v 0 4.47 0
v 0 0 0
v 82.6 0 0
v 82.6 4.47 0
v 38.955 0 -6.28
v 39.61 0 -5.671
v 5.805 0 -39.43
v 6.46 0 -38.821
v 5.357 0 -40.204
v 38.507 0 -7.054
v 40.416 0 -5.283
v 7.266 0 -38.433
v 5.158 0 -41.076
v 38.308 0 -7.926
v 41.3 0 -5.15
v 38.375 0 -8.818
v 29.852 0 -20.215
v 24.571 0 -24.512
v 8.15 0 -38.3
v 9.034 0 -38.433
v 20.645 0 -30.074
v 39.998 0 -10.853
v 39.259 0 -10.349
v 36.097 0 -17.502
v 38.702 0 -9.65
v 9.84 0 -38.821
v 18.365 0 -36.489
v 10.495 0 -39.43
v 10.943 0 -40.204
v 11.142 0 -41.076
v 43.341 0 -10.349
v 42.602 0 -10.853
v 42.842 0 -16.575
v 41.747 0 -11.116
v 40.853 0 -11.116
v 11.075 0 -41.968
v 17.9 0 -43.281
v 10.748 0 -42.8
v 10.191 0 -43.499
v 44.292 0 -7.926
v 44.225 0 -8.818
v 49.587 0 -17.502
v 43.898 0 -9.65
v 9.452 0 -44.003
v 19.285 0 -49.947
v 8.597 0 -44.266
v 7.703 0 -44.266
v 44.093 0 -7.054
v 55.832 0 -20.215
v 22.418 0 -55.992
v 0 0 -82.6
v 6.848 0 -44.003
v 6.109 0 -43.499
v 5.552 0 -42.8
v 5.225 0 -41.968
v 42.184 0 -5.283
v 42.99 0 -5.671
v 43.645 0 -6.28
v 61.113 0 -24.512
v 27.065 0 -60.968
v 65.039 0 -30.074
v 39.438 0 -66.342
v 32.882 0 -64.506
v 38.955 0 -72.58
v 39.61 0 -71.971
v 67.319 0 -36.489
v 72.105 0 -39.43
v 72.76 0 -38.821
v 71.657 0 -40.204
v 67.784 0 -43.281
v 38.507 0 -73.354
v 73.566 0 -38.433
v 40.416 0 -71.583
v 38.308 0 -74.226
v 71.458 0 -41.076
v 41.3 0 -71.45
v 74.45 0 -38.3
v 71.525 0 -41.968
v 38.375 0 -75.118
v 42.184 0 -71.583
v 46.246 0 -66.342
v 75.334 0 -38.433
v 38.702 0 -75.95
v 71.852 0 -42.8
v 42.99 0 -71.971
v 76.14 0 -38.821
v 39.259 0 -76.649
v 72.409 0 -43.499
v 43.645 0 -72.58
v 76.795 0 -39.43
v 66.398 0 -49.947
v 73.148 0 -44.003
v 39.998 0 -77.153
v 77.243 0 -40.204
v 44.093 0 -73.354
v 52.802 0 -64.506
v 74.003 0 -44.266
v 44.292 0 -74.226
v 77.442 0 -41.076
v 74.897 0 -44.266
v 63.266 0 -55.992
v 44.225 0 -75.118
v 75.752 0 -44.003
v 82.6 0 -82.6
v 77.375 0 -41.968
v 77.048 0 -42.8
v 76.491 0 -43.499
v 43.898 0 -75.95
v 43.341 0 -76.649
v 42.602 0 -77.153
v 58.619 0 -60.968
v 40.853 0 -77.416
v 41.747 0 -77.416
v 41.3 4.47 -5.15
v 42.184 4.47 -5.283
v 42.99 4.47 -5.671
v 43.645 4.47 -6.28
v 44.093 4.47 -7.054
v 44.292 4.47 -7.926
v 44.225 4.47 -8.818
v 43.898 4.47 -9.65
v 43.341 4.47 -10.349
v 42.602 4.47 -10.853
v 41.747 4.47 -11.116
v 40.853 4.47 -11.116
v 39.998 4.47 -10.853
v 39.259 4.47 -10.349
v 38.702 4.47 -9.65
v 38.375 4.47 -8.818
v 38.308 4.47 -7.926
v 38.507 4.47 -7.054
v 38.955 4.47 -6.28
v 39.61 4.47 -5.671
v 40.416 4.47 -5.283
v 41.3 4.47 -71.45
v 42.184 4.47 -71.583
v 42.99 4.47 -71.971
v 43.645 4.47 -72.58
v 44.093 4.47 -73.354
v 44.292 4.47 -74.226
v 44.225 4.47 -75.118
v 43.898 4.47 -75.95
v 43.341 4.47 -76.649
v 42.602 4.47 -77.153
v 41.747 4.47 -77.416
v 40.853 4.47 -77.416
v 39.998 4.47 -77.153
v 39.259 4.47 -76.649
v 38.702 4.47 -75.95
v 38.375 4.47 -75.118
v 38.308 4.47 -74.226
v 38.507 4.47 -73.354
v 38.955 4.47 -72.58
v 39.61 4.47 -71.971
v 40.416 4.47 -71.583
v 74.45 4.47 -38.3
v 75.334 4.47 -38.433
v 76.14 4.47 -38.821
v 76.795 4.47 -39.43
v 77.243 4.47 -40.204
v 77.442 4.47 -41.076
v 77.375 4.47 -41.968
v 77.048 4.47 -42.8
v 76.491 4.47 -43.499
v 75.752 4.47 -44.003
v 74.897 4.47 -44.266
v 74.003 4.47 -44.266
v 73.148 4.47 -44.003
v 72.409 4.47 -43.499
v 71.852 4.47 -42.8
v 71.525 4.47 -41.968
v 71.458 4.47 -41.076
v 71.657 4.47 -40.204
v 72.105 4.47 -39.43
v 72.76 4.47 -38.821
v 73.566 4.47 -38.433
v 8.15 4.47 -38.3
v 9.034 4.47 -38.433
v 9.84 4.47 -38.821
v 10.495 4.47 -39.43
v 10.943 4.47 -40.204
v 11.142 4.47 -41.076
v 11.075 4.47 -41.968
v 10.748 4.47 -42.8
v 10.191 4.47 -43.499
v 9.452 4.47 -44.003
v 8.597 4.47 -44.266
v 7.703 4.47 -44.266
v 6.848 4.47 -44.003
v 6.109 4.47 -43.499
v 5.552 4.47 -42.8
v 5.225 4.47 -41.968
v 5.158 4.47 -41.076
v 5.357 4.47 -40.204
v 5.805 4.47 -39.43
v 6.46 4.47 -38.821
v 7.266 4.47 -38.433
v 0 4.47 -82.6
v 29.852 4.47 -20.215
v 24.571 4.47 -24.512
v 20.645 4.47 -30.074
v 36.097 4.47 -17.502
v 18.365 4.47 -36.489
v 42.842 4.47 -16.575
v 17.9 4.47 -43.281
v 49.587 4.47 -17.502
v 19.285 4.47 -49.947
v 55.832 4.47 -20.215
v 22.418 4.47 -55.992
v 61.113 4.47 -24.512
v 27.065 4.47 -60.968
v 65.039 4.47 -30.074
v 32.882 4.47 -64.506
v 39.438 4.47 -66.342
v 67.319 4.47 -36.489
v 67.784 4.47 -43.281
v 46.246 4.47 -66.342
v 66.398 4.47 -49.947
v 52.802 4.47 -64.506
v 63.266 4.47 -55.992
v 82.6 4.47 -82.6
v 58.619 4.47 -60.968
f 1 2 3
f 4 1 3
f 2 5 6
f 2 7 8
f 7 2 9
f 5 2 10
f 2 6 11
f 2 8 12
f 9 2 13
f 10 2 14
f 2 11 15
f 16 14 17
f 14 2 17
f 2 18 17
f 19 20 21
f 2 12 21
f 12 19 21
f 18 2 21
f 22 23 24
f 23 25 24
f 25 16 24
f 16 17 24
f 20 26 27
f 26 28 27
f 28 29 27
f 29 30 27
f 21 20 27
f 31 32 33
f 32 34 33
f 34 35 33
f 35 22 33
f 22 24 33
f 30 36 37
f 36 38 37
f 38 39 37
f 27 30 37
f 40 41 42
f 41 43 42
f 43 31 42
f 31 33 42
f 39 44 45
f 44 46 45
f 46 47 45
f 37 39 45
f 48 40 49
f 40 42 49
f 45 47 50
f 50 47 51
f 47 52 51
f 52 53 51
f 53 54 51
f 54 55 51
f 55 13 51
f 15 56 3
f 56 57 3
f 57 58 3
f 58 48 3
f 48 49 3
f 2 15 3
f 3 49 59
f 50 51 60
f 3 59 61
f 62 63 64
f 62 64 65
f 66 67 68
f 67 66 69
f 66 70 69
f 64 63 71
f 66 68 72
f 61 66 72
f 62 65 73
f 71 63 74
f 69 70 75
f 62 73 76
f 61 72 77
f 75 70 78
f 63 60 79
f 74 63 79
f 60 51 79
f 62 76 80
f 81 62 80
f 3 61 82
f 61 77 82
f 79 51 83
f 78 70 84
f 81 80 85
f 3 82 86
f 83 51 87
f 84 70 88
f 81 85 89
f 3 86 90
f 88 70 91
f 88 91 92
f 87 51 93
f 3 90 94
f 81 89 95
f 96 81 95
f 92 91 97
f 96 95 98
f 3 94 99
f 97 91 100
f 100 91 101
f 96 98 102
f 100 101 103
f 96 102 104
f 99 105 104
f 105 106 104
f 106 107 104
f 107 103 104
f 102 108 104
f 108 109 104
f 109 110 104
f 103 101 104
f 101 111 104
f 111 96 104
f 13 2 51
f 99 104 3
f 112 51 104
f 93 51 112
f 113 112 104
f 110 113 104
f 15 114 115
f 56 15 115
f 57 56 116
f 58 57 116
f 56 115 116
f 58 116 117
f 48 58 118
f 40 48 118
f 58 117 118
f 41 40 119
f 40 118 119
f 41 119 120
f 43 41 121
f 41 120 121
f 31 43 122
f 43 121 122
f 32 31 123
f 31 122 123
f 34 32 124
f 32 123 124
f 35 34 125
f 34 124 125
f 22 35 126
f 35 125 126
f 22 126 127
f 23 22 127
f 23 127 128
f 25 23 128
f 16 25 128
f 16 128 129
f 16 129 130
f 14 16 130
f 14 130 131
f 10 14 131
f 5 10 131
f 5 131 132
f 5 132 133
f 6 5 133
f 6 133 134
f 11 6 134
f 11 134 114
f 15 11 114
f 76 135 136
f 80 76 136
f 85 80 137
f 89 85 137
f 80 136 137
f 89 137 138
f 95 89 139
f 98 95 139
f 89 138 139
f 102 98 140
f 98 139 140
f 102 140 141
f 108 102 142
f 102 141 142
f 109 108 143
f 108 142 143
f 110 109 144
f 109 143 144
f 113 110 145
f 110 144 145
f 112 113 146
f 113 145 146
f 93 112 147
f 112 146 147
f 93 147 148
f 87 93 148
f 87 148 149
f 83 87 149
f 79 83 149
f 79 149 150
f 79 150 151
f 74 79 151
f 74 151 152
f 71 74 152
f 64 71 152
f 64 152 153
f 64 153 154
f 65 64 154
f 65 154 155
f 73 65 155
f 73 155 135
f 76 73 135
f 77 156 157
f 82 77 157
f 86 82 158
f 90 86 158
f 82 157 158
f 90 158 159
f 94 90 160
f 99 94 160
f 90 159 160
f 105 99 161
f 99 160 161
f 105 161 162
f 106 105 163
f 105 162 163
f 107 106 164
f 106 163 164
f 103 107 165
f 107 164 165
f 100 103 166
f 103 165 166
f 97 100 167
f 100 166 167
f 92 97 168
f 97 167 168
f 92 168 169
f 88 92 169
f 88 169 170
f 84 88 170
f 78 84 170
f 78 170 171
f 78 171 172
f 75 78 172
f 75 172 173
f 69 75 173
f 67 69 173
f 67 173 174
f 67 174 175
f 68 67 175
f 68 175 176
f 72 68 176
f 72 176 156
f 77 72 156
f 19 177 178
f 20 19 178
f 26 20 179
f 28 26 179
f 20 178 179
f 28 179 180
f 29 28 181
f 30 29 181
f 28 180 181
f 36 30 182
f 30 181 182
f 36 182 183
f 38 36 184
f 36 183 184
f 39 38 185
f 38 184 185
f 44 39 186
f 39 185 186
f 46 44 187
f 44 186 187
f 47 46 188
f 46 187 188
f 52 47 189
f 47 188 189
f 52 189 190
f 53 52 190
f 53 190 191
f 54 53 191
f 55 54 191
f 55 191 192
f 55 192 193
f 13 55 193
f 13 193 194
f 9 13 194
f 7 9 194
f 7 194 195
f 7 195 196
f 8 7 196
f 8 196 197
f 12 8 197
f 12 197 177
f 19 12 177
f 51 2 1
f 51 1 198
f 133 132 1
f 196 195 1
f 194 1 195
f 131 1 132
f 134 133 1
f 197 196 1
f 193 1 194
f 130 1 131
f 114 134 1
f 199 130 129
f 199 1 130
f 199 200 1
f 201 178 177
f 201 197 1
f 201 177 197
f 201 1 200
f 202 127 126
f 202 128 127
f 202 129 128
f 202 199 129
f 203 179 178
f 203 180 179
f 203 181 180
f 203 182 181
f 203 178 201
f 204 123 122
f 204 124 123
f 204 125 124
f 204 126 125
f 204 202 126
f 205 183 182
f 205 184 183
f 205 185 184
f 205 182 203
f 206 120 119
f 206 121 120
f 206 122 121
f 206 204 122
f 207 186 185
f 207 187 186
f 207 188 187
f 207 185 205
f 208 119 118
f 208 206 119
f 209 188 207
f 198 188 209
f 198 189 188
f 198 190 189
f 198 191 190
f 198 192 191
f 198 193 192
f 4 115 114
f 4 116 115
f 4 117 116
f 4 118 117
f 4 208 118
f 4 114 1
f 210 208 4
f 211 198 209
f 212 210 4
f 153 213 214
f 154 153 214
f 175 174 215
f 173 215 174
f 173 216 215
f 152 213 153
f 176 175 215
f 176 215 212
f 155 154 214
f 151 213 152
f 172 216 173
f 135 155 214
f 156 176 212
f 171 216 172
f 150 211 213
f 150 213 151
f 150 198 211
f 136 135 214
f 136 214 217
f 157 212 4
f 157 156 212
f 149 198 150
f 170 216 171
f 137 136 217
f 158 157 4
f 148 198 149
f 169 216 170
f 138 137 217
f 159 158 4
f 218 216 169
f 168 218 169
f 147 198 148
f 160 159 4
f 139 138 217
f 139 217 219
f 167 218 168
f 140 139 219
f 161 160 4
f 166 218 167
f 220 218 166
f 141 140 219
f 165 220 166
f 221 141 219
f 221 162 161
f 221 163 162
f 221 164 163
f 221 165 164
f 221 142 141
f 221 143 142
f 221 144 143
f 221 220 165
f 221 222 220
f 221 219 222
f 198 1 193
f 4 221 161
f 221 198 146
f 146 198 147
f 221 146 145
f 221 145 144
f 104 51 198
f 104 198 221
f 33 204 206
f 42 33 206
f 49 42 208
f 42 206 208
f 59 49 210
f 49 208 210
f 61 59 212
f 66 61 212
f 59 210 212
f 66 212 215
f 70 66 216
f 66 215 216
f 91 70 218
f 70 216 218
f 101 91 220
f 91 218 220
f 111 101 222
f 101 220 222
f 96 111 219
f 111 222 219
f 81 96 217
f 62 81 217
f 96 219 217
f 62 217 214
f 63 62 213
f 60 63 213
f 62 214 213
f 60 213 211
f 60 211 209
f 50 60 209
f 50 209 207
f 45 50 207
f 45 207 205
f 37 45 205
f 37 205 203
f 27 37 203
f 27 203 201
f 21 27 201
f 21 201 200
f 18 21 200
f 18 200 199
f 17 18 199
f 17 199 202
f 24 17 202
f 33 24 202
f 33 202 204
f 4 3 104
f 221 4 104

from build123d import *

# Parameters (mm, degrees)
SKETCH1_W           = 82.6
SKETCH1_H           = 82.6
BOSS_EXTRUDE1_DEPTH = 4.47
SKETCH5_R           = 25
CUT_EXTRUDE2_DEPTH  = 117.899533361
SKETCH7_R           = 3
CUT_EXTRUDE3_DEPTH  = 117.899533361


with BuildPart() as part:
    # Sketch1 → Boss-Extrude1 (new body)
    with BuildSketch(Plane(origin=(0, 0, 0), x_dir=(1, 0, 0), z_dir=(0, 1, 0))):
        with Locations((41.3, 41.3)):
            Rectangle(SKETCH1_W, SKETCH1_H)
    extrude(amount=BOSS_EXTRUDE1_DEPTH)

    # Sketch5 → Cut-Extrude2 (cut, through all)
    with BuildSketch(Plane(origin=(0, 4.47, 0), x_dir=(1, 0, 0), z_dir=(0, 1, 0))):
        with Locations(Location((42.841926389, 41.575343998, 0), (0, 0, 270))):
            Circle(SKETCH5_R)
    extrude(amount=-CUT_EXTRUDE2_DEPTH, mode=Mode.SUBTRACT)

    # Sketch7 → Cut-Extrude3 (cut, through all)
    with BuildSketch(Plane(origin=(0, 4.47, 0), x_dir=(1, 0, 0), z_dir=(0, 1, 0))):
        with Locations(Location((8.15, 41.3, 0), (0, 0, 270))):
            Circle(SKETCH7_R)
        with Locations(Location((41.3, 74.45, 0), (0, 0, 270))):
            Circle(SKETCH7_R)
        with Locations(Location((74.45, 41.3, 0), (0, 0, 270))):
            Circle(SKETCH7_R)
        with Locations(Location((41.3, 8.15, 0), (0, 0, 270))):
            Circle(SKETCH7_R)
    extrude(amount=-CUT_EXTRUDE3_DEPTH, mode=Mode.SUBTRACT)


solid = part.part
